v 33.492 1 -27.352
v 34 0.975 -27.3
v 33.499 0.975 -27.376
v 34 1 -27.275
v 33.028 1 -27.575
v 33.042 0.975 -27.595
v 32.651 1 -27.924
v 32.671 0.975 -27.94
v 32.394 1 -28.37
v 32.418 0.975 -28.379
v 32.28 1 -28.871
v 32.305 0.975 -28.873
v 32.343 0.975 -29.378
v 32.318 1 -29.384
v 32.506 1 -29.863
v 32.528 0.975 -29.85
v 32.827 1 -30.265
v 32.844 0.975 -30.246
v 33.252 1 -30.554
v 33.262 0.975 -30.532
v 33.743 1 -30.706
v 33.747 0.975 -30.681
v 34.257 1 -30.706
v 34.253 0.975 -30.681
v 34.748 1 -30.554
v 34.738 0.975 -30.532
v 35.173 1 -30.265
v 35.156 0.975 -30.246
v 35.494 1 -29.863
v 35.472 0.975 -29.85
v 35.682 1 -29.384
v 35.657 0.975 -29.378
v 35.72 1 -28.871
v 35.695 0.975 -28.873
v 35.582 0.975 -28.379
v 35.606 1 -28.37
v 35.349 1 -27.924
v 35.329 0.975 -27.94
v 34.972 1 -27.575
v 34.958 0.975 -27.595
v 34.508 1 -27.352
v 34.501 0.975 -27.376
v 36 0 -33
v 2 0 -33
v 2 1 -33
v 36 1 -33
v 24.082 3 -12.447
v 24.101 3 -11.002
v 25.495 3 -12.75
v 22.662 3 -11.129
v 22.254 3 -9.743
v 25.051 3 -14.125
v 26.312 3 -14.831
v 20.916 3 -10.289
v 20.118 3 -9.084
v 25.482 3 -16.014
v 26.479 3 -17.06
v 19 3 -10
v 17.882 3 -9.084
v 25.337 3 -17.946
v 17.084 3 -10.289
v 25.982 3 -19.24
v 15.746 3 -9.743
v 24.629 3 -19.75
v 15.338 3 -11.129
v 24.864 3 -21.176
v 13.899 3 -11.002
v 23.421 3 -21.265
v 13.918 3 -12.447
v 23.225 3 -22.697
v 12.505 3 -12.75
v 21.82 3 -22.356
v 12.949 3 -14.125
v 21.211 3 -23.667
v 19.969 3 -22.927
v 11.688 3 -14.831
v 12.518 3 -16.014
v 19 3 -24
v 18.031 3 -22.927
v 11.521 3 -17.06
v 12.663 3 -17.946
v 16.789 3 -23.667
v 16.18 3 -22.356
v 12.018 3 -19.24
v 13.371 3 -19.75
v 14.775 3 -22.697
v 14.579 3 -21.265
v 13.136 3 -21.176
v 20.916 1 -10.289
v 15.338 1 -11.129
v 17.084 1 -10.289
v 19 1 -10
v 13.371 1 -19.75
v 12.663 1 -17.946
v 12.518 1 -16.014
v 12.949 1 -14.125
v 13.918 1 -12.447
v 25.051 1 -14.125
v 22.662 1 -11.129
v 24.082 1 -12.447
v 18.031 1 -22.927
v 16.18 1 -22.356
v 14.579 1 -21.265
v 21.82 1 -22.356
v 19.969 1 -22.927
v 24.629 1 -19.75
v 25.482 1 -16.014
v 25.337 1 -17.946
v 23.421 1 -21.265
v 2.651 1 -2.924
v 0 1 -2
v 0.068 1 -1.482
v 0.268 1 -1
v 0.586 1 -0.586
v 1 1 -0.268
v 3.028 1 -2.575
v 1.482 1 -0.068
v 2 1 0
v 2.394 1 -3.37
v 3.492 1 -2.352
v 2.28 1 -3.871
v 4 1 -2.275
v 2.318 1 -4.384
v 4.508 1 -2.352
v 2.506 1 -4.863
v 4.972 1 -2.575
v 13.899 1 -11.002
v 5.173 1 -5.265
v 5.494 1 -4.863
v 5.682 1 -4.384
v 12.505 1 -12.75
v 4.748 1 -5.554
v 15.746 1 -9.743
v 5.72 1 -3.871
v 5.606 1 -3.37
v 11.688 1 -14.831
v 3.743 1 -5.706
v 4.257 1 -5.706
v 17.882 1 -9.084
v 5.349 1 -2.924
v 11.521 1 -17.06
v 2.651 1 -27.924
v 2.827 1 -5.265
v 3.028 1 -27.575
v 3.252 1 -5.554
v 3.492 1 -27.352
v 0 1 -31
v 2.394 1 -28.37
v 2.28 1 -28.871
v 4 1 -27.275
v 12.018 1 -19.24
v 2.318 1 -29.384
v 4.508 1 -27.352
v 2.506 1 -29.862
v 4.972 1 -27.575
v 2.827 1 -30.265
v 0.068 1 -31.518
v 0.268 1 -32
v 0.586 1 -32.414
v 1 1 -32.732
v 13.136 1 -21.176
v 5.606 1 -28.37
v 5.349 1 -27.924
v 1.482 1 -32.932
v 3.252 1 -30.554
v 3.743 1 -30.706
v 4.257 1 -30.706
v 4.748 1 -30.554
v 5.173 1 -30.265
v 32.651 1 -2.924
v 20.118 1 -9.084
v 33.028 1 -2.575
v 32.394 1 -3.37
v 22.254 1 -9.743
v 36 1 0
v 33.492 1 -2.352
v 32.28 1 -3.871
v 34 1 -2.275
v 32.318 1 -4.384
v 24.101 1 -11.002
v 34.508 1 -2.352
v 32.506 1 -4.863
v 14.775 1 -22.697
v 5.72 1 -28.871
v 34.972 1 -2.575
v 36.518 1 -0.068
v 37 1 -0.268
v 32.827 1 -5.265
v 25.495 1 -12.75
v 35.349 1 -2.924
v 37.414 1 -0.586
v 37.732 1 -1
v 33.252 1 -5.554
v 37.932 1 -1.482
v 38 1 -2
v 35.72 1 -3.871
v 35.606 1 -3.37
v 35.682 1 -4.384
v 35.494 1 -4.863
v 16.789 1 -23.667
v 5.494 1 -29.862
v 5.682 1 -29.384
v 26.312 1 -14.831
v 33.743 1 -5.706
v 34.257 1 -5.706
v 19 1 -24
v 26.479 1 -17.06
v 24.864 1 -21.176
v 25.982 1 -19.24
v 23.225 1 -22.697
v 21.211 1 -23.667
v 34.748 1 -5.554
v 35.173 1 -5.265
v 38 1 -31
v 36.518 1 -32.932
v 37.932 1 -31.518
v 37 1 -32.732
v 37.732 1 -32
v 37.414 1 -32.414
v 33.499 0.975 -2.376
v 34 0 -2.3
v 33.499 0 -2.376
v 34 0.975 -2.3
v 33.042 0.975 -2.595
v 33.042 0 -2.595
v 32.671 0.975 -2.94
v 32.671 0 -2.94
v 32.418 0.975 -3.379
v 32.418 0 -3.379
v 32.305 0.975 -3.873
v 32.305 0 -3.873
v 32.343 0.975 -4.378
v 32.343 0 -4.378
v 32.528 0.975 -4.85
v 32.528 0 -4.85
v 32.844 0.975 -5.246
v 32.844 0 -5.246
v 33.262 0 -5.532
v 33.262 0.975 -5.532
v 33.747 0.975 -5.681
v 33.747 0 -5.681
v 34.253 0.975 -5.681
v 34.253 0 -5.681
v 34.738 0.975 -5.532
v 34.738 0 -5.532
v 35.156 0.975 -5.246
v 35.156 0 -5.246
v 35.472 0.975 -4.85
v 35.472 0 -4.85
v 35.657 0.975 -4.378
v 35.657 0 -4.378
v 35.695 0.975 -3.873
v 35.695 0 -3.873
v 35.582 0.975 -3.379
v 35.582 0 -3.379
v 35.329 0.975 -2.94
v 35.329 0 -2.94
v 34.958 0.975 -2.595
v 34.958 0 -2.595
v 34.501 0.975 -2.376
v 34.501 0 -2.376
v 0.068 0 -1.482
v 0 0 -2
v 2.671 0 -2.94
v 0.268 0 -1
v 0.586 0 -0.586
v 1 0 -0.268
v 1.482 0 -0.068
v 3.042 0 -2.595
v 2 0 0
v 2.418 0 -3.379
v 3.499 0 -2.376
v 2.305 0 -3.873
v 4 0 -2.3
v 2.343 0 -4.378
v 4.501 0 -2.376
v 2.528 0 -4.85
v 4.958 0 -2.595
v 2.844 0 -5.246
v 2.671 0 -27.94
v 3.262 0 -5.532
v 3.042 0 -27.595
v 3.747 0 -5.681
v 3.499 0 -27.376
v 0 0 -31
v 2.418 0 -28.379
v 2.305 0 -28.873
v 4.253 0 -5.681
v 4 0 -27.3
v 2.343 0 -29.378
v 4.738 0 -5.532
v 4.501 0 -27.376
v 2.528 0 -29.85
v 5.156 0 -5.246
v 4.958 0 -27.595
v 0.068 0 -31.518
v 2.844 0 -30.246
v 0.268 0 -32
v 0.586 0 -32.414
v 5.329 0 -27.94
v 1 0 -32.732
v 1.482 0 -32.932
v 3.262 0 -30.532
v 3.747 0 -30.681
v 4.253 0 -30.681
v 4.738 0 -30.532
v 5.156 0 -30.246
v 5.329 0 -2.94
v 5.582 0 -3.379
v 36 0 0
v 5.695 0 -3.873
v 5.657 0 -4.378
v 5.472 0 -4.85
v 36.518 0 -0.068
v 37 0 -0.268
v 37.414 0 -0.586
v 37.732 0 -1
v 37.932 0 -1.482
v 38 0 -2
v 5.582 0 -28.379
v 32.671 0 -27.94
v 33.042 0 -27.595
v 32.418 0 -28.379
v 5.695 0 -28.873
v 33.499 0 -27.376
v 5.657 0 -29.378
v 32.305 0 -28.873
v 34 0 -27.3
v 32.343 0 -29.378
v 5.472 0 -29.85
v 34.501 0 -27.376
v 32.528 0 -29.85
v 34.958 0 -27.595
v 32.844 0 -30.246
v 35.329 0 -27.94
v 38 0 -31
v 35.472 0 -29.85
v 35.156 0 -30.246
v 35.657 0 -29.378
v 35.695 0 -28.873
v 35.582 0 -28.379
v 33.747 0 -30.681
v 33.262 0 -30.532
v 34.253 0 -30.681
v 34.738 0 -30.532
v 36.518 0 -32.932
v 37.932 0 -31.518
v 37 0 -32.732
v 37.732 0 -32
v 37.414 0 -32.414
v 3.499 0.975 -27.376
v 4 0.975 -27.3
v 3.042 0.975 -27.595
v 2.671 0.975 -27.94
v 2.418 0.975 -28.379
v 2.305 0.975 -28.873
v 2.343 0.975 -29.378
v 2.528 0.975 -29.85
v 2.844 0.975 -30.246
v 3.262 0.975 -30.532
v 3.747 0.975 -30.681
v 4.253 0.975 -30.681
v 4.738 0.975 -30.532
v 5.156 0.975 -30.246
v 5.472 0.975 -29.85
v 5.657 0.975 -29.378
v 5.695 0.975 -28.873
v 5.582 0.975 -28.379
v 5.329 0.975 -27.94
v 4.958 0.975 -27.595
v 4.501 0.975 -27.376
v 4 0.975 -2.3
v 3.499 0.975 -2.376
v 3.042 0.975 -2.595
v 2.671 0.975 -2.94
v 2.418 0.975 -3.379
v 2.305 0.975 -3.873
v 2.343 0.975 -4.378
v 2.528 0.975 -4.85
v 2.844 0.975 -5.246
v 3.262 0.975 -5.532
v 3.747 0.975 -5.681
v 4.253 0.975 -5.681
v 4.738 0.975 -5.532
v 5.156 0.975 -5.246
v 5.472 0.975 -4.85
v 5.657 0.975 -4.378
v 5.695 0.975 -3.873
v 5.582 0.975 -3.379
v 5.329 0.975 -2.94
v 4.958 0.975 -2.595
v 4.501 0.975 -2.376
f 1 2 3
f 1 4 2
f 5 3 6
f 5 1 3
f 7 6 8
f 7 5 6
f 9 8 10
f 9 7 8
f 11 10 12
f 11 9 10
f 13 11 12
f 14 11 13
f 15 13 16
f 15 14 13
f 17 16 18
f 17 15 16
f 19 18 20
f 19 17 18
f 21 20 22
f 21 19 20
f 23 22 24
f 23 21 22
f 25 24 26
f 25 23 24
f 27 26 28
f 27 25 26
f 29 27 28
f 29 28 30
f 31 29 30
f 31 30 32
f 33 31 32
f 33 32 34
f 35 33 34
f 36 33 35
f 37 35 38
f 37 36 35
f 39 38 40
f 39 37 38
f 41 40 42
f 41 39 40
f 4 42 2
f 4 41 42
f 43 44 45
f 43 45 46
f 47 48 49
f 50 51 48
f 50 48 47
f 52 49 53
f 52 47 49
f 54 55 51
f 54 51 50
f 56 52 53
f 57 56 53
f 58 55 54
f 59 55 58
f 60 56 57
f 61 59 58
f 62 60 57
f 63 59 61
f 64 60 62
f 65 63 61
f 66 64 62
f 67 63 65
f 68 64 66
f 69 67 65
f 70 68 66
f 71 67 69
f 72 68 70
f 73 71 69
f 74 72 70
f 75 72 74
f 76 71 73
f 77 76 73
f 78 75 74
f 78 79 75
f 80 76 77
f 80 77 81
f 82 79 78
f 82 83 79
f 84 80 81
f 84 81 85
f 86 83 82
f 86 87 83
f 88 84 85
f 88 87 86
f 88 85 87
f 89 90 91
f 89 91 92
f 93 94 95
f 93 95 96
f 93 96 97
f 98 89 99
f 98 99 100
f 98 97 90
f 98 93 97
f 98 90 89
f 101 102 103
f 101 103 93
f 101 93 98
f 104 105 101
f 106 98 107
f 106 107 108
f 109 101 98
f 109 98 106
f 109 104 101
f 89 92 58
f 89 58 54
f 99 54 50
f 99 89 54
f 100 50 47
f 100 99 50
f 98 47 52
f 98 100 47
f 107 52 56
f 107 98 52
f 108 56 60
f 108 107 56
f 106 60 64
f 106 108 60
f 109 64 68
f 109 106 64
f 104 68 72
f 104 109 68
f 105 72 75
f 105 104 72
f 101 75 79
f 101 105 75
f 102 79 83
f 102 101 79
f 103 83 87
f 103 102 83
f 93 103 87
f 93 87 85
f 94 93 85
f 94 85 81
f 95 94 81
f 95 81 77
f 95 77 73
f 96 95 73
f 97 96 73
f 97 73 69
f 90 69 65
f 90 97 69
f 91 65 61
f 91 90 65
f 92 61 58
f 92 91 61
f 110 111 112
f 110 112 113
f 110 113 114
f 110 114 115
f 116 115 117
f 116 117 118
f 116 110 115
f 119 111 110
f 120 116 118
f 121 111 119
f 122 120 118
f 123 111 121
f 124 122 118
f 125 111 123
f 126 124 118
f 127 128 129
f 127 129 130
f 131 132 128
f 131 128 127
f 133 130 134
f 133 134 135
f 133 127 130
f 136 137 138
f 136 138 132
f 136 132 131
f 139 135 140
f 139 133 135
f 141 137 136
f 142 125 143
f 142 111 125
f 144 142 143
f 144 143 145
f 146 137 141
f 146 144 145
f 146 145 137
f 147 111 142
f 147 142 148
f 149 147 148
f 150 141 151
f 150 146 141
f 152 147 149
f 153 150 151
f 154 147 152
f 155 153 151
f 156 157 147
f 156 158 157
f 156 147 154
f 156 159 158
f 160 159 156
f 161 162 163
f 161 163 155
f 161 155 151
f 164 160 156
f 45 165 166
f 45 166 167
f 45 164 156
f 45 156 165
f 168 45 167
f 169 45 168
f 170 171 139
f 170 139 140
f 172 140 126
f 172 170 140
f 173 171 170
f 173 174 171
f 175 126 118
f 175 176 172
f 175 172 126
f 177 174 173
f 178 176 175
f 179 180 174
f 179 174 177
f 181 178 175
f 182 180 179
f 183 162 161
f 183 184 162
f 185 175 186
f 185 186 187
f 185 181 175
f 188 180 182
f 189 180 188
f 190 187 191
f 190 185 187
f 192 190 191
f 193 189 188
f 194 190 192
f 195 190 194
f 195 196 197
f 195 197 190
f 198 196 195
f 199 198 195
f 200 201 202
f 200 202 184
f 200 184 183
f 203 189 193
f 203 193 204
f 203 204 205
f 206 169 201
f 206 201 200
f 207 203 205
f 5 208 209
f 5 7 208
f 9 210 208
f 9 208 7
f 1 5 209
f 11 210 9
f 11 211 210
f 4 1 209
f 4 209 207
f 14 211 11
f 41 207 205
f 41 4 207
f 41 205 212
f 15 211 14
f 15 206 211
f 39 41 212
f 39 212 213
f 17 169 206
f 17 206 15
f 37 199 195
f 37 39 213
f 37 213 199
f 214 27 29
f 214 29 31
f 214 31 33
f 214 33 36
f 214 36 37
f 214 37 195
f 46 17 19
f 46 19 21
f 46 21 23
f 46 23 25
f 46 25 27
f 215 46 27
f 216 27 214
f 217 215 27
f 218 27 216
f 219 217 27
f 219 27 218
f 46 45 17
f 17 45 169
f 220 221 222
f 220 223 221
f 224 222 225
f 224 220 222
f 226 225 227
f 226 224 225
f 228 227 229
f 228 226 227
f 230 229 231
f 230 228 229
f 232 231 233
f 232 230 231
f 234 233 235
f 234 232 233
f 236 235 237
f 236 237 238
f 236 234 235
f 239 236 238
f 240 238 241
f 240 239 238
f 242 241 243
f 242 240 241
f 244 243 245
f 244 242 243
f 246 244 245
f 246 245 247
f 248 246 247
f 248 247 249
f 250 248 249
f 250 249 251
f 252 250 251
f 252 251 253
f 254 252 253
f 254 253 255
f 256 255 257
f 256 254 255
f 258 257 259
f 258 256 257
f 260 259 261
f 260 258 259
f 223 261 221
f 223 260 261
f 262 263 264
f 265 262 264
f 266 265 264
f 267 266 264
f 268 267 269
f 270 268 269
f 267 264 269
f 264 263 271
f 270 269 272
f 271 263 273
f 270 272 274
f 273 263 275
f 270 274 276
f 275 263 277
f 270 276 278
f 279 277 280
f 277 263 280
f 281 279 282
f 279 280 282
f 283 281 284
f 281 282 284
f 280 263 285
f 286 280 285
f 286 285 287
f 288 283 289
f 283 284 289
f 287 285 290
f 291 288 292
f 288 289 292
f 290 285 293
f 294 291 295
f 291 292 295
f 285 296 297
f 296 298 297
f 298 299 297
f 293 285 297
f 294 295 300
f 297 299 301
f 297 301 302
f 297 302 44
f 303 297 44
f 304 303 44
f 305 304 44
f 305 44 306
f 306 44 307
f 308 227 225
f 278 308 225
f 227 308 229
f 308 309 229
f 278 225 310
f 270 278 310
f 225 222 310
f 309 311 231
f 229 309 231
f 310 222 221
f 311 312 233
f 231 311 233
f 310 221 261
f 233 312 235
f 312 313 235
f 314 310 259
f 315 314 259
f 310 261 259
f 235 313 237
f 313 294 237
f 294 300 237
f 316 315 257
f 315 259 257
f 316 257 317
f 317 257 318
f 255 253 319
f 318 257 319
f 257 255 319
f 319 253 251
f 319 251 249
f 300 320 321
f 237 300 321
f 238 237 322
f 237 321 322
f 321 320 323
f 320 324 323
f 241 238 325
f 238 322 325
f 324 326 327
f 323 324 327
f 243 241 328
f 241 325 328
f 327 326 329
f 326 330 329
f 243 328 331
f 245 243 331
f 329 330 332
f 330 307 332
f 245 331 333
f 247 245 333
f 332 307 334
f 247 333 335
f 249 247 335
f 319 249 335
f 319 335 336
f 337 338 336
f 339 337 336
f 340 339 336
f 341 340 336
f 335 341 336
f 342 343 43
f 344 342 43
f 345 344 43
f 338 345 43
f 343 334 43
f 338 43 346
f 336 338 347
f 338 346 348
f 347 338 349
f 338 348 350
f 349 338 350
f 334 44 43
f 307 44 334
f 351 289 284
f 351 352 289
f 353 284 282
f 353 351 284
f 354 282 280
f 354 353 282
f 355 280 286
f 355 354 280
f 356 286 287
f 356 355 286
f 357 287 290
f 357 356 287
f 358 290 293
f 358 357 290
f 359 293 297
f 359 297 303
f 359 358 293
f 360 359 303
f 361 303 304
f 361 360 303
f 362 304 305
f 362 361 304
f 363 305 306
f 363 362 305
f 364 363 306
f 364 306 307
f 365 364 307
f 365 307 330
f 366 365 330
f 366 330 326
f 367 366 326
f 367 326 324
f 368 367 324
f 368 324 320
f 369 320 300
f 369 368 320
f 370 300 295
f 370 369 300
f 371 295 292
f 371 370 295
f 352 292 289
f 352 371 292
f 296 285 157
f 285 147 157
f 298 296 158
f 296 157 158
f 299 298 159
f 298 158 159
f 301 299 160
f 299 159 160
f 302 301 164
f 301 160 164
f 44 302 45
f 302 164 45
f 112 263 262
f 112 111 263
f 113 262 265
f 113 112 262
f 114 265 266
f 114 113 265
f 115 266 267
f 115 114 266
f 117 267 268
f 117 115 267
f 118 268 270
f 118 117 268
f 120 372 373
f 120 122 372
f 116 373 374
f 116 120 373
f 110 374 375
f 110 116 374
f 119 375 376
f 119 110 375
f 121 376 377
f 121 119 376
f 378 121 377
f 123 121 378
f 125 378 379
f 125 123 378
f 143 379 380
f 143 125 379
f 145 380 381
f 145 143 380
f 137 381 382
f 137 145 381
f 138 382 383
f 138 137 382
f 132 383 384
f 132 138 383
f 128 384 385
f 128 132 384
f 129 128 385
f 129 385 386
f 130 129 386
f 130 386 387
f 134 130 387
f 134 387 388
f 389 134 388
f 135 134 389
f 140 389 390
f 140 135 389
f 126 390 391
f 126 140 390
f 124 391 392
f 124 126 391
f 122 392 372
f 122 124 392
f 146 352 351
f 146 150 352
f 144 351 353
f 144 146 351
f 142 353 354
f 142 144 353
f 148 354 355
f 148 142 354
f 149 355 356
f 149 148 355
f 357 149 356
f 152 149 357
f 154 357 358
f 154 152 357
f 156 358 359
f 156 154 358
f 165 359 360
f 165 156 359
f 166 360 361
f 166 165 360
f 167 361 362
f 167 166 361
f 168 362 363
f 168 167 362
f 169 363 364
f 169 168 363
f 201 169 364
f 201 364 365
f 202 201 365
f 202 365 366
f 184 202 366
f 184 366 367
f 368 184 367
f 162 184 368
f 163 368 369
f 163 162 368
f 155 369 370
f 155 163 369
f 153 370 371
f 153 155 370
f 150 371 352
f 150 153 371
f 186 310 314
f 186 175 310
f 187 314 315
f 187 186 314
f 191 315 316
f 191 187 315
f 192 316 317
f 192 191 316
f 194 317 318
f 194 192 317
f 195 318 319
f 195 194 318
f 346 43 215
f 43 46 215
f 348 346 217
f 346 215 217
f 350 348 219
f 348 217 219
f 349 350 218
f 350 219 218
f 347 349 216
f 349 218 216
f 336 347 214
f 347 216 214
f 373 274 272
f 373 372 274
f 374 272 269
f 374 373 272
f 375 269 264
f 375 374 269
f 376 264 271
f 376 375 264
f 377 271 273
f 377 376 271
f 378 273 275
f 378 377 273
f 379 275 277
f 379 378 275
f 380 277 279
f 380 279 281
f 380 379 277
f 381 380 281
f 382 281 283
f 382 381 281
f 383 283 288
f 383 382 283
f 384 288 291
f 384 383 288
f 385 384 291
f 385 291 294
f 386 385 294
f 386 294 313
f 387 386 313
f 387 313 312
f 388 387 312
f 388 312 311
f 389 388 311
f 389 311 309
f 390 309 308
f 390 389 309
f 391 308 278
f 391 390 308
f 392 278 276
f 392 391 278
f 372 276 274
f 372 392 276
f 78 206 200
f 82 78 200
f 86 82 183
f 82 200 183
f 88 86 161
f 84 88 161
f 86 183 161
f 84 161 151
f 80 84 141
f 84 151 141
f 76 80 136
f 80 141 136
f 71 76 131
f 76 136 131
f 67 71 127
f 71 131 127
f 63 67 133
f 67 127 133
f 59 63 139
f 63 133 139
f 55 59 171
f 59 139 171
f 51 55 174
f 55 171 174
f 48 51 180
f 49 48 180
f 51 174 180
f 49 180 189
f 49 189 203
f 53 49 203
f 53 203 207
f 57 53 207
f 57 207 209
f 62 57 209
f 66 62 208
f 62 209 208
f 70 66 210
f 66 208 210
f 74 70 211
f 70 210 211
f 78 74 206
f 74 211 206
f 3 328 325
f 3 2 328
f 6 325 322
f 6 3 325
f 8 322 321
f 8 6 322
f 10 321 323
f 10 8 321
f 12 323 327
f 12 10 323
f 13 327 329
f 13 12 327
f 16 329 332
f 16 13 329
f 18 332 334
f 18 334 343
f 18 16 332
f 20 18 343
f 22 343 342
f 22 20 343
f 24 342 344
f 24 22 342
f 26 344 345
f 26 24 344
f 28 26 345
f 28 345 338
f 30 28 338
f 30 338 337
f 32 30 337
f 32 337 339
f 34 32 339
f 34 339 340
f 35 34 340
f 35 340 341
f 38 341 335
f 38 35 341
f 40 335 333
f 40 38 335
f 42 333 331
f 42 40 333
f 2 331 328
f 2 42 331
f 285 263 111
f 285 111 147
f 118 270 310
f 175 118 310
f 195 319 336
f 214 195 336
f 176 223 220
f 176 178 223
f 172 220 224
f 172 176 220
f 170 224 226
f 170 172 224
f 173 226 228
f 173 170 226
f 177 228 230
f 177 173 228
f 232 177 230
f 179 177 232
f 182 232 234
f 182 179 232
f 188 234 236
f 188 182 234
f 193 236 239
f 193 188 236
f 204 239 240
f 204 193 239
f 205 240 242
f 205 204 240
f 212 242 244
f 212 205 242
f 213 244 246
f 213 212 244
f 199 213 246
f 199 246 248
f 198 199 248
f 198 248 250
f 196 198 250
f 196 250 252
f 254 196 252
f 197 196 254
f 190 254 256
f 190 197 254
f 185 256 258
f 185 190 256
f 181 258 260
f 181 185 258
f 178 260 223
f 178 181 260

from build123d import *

# Parameters (mm, degrees)
SKETCH1_W                     = 38
SKETCH1_H                     = 33
BOSS_EXTRUDE1_DEPTH           = 1
SKETCH2_R                     = 7.5
SKETCH2_R_2                   = 6.5
BOSS_EXTRUDE2_DEPTH           = 2
M3_CLEARANCE_HOLE1_AT_2_COUNT = 2
M3_CLEARANCE_HOLE1_AT_2_PITCH = 25
M3_CLEARANCE_HOLE1_AT_3_COUNT = 2
M3_CLEARANCE_HOLE1_AT_3_PITCH = 39.05124838
M3_CLEARANCE_HOLE1_AT_4_COUNT = 2
M3_CLEARANCE_HOLE1_AT_4_PITCH = 30
FILLET1_R                     = 2


with BuildPart() as part:
    # Sketch1 → Boss-Extrude1 (new body)
    with BuildSketch(Plane(origin=(0, 0, 0), x_dir=(1, 0, 0), z_dir=(0, 1, 0))):
        with Locations((19, 16.5)):
            Rectangle(SKETCH1_W, SKETCH1_H)
    extrude(amount=BOSS_EXTRUDE1_DEPTH)

    # Sketch2 → Boss-Extrude2 (add)
    with BuildSketch(Plane(origin=(0, 1, 0), x_dir=(1, 0, 0), z_dir=(0, 1, 0))):
        with Locations(Location((19, 16.5, 0), (0, 0, 90))):
            Circle(SKETCH2_R)
        with Locations(Location((19, 16.5, 0), (0, 0, 270))):
            Circle(SKETCH2_R_2, mode=Mode.SUBTRACT)
    extrude(amount=BOSS_EXTRUDE2_DEPTH)

    # Sketch4 → M3 Clearance Hole1 (revolve, cut)
    with BuildSketch(Plane(origin=(4, 1, -4), x_dir=(0, 0, 1), z_dir=(1, 0, 0))):
        Polygon((0, 0), (0, 1), (1.7, 1), (1.7, 0.025), (1.725, 0), align=None)
    m3_clearance_hole1 = revolve(axis=Axis((4, 7.35, -4), (0, -1, 0)), mode=Mode.SUBTRACT)

    # M3 Clearance Hole1 at 2: M3 Clearance Hole1 ×2
    with Locations(*[(0, 0, -i * M3_CLEARANCE_HOLE1_AT_2_PITCH) for i in range(1, M3_CLEARANCE_HOLE1_AT_2_COUNT)]):
        add(m3_clearance_hole1, mode=Mode.SUBTRACT)

    # M3 Clearance Hole1 at 3: M3 Clearance Hole1 ×2
    with Locations(*[Vector(0.768221279597376, 0, -0.6401843996644799) * (i * M3_CLEARANCE_HOLE1_AT_3_PITCH) for i in range(1, M3_CLEARANCE_HOLE1_AT_3_COUNT)]):
        add(m3_clearance_hole1, mode=Mode.SUBTRACT)

    # M3 Clearance Hole1 at 4: M3 Clearance Hole1 ×2
    with Locations(*[(i * M3_CLEARANCE_HOLE1_AT_4_PITCH, 0, 0) for i in range(1, M3_CLEARANCE_HOLE1_AT_4_COUNT)]):
        add(m3_clearance_hole1, mode=Mode.SUBTRACT)

    # Fillet1
    fillet1_edges = [part.edges().sort_by_distance(p)[0] for p in [
        (0, 0.5, -33),
        (38, 0.5, -33),
        (38, 0.5, 0),
        (0, 0.5, 0),
    ]]
    fillet(fillet1_edges, radius=FILLET1_R)


solid = part.part
